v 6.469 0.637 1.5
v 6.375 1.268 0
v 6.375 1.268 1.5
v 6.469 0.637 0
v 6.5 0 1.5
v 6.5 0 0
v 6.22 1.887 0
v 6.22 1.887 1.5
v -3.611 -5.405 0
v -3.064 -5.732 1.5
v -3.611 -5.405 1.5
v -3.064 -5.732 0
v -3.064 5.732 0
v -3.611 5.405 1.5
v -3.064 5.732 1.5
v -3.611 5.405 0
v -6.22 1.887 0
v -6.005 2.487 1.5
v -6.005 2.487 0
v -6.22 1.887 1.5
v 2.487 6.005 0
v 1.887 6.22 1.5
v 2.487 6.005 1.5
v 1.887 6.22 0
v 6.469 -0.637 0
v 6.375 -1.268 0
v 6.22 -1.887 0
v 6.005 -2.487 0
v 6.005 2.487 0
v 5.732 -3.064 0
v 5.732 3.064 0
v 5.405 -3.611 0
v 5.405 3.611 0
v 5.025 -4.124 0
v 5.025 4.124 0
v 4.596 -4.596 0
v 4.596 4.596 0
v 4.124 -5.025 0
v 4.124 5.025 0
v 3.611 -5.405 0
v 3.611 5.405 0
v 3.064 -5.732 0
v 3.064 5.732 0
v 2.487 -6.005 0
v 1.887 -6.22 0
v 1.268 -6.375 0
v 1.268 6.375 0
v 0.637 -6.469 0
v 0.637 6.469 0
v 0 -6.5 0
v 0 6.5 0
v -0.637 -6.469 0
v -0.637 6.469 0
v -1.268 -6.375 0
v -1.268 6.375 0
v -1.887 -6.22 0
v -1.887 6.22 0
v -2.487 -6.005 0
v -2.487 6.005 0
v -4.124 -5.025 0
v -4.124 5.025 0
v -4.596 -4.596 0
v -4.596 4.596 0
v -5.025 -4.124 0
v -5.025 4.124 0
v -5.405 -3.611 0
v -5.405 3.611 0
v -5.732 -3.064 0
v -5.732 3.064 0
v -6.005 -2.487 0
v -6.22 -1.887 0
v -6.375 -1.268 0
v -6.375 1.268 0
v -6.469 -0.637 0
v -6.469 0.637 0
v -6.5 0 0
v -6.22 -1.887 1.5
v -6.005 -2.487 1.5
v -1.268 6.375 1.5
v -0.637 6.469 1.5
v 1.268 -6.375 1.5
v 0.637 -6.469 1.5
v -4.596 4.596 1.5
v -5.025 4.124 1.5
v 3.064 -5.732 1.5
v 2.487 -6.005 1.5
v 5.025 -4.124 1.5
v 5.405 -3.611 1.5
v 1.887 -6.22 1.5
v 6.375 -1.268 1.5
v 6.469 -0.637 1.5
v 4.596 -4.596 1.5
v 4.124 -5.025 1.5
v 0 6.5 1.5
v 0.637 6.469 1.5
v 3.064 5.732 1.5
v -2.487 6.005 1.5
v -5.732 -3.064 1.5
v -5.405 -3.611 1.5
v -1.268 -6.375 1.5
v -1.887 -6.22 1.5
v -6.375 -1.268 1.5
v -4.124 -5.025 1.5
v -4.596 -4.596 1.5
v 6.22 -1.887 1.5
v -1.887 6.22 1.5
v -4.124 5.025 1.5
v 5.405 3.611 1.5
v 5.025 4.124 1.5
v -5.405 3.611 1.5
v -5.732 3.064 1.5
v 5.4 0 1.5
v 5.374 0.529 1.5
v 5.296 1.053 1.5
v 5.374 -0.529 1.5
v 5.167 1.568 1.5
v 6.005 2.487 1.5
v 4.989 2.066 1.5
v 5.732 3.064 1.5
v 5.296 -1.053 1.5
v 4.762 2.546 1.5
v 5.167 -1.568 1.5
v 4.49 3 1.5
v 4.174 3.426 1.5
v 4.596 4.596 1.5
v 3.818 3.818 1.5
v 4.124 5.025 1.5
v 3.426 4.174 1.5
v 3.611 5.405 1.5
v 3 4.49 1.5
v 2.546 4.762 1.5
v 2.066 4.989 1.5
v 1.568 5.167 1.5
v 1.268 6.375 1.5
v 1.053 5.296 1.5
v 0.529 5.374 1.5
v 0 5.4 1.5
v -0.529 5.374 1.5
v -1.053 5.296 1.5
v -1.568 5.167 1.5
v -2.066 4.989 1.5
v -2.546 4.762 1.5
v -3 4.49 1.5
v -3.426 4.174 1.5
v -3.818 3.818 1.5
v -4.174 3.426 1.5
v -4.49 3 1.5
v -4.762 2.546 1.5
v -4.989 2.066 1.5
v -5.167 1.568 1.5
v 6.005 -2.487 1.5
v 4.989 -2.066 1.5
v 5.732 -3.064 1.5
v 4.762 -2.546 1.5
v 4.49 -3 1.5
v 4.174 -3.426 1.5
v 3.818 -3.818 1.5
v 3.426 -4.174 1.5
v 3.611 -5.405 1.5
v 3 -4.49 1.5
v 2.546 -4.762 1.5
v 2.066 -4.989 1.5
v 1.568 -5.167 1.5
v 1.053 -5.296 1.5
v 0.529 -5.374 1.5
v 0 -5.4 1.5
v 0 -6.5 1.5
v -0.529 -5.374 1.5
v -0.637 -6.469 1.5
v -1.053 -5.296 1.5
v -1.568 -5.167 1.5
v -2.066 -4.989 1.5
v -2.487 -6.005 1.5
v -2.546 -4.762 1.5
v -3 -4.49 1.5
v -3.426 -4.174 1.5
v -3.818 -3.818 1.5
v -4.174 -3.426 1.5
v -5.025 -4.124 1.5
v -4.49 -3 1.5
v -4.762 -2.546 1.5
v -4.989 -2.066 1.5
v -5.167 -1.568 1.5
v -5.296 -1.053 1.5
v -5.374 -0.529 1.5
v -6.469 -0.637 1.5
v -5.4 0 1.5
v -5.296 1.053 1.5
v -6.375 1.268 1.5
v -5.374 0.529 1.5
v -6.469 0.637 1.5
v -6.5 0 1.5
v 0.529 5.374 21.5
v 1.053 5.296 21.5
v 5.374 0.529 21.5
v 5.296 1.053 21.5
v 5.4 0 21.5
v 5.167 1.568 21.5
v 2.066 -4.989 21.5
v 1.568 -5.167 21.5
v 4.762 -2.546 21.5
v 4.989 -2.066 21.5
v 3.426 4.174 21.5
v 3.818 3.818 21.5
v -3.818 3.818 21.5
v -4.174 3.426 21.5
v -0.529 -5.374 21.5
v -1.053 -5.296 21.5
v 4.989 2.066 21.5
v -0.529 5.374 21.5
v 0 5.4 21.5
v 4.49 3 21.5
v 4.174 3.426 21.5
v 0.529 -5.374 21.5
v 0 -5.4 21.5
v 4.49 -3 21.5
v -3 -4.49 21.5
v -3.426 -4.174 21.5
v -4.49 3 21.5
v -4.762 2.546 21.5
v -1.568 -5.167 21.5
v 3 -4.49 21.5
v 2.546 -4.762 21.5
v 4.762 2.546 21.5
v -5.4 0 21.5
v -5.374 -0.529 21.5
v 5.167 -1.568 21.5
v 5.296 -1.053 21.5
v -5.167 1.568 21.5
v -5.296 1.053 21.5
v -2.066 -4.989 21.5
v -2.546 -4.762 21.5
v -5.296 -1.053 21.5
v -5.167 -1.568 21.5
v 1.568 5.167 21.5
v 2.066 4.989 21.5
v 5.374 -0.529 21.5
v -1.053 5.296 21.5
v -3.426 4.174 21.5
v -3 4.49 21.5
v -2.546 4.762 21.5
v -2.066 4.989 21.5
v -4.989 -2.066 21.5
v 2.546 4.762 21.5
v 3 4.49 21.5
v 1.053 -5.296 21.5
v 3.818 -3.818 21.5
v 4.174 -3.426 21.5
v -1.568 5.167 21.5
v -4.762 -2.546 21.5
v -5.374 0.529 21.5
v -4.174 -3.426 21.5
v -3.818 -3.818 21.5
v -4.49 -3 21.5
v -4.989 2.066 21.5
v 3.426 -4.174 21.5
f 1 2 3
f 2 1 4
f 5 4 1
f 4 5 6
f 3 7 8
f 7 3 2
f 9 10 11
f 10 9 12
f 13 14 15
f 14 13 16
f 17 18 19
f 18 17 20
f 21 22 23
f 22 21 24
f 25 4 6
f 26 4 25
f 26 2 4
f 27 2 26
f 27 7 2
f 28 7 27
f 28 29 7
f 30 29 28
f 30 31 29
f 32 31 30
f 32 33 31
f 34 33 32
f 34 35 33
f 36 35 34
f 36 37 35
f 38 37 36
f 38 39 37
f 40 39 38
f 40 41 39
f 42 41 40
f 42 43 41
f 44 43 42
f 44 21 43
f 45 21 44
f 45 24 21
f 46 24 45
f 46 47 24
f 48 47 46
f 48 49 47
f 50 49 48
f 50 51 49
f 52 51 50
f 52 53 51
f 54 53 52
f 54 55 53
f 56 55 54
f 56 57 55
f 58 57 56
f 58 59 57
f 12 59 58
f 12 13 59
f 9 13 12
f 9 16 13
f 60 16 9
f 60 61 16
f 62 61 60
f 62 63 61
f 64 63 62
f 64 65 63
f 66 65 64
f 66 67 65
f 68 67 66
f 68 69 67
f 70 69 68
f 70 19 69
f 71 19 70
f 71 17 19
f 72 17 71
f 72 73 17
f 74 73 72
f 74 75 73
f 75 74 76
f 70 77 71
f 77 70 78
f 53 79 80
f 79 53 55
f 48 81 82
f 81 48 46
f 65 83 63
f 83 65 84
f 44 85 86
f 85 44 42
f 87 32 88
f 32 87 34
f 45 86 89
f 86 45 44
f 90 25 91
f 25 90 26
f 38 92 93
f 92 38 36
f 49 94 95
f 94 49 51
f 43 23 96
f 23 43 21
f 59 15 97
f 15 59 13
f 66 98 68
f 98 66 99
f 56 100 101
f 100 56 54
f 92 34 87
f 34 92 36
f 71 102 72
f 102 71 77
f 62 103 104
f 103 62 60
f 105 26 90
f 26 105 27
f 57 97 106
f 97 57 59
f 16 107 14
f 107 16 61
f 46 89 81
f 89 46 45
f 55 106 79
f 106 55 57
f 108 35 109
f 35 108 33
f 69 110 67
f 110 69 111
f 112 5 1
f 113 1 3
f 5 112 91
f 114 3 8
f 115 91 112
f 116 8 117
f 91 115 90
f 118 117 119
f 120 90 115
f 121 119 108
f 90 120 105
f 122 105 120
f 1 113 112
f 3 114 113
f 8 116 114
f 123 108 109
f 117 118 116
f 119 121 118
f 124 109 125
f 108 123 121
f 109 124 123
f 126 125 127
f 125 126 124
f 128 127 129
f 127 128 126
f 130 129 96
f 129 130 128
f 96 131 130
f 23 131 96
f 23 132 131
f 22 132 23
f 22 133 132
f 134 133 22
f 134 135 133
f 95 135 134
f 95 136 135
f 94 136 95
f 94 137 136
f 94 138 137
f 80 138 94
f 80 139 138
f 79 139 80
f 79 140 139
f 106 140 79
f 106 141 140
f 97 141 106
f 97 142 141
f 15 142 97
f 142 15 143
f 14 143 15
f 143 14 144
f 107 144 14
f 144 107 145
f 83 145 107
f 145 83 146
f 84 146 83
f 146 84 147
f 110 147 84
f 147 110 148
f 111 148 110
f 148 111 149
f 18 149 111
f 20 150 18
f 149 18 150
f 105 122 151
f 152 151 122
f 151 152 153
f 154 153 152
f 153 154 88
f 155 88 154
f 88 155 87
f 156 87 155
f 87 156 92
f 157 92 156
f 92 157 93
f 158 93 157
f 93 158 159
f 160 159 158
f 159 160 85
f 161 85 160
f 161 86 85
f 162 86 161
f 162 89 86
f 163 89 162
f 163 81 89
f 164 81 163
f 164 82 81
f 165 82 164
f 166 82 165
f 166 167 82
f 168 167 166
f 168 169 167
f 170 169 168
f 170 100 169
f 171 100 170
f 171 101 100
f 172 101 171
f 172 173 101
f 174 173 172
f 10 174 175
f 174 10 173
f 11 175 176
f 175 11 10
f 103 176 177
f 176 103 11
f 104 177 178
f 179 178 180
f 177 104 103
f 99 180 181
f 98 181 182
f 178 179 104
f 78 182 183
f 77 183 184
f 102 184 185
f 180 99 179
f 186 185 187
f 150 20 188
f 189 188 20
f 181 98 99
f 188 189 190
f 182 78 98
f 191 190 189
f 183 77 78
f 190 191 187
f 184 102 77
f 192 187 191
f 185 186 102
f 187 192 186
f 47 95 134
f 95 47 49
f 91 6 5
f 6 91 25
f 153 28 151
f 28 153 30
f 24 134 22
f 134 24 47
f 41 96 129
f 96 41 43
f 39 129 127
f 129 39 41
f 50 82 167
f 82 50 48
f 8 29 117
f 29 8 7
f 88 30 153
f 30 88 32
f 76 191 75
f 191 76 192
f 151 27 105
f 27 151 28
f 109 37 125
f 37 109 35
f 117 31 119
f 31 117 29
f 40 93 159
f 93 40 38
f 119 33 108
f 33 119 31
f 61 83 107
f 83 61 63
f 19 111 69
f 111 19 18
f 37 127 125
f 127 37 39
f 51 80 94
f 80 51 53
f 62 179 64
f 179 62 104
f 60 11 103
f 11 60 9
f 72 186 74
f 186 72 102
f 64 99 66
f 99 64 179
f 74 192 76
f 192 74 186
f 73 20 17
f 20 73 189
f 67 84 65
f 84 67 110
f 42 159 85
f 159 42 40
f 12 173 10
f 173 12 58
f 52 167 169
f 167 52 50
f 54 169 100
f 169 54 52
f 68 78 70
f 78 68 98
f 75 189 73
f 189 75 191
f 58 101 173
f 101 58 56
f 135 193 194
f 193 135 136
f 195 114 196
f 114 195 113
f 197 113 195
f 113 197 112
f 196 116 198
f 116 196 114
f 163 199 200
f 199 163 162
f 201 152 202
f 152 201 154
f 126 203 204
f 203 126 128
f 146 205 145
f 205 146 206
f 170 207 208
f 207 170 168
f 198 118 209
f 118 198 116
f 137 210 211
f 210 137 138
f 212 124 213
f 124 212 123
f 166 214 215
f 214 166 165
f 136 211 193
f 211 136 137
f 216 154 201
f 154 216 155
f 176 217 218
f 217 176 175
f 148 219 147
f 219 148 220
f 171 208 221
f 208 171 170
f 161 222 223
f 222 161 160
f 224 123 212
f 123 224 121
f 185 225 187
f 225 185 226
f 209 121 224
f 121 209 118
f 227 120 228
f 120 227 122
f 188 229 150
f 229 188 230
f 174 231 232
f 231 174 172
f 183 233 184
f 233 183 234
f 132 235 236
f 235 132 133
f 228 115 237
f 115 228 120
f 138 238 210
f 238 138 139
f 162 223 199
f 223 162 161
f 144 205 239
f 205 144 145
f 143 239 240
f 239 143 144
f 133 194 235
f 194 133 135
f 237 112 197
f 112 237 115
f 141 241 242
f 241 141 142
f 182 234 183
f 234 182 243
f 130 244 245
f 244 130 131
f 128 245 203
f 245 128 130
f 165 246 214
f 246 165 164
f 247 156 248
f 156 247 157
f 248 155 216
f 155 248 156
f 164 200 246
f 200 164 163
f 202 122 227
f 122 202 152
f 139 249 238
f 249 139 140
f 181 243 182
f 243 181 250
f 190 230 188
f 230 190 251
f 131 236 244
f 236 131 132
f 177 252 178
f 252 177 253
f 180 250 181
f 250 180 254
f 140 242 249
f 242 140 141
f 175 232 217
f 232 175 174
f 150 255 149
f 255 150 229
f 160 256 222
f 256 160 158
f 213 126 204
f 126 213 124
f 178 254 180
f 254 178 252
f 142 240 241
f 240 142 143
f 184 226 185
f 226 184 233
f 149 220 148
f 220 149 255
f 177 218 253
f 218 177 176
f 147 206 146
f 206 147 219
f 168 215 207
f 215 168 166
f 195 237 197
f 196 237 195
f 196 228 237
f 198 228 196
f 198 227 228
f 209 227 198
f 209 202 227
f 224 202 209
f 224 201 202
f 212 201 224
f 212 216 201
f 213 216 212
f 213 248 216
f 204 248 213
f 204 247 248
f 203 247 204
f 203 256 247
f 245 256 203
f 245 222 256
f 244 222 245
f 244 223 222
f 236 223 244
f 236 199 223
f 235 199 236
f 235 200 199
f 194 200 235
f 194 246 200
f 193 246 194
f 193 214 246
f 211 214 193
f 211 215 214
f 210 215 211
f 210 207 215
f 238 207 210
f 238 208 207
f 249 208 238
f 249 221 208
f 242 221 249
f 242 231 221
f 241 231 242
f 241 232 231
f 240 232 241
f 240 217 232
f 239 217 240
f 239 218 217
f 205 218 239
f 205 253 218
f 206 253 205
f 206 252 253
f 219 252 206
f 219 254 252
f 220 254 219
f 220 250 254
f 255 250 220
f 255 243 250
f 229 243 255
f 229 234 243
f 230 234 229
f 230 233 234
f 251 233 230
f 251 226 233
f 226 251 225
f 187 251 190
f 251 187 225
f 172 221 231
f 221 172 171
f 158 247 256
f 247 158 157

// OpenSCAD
// Adapter sleeve for 0.2 mL PCR tubes in 1.5 mL rack holes.
// Designed to be printed upside down (collar on the bed).

collar_d = 13.0;      // Diameter of the base collar
collar_t = 1.5;       // Thickness of the base collar
sleeve_d = 10.8;      // Outer diameter of the sleeve body
sleeve_h = 21.5 - 1.5; // Height of the sleeve body (total height 21.5 - collar 1.5)
bore_d   = 6.2;       // Diameter of the central bore

$fn = 64;

// The model is built with the collar at z=0 as requested.
union() {
    // The base collar
    cylinder(h = collar_t, d = collar_d);
    
    // The sleeve body rising from the collar
    translate([0, 0, collar_t])
        cylinder(h = sleeve_h, d = sleeve_d);
}

// Subtract the bore through the entire height
difference() {
    // We use a union of the parts above and then subtract the bore.
    // To keep the code clean, we'll wrap the whole thing in a difference.
    // However, to follow the "build upward" rule, we define the solid first.
    
    // This is a structural rewrite to ensure the difference works correctly:
}

// Corrected structure for the difference operation
difference() {
    // The solid object
    union() {
        cylinder(h = collar_t, d = collar_d);
        translate([0, 0, collar_t])
            cylinder(h = sleeve_h, d = sleeve_d);
    }
    
    // The bore (drilled through the full height)
    // We extend the cylinder slightly below z=0 and above z=21.5 to ensure clean cuts
    translate([0, 0, -1])
        cylinder(h = 21.5 + 2, d = bore_d);
}
